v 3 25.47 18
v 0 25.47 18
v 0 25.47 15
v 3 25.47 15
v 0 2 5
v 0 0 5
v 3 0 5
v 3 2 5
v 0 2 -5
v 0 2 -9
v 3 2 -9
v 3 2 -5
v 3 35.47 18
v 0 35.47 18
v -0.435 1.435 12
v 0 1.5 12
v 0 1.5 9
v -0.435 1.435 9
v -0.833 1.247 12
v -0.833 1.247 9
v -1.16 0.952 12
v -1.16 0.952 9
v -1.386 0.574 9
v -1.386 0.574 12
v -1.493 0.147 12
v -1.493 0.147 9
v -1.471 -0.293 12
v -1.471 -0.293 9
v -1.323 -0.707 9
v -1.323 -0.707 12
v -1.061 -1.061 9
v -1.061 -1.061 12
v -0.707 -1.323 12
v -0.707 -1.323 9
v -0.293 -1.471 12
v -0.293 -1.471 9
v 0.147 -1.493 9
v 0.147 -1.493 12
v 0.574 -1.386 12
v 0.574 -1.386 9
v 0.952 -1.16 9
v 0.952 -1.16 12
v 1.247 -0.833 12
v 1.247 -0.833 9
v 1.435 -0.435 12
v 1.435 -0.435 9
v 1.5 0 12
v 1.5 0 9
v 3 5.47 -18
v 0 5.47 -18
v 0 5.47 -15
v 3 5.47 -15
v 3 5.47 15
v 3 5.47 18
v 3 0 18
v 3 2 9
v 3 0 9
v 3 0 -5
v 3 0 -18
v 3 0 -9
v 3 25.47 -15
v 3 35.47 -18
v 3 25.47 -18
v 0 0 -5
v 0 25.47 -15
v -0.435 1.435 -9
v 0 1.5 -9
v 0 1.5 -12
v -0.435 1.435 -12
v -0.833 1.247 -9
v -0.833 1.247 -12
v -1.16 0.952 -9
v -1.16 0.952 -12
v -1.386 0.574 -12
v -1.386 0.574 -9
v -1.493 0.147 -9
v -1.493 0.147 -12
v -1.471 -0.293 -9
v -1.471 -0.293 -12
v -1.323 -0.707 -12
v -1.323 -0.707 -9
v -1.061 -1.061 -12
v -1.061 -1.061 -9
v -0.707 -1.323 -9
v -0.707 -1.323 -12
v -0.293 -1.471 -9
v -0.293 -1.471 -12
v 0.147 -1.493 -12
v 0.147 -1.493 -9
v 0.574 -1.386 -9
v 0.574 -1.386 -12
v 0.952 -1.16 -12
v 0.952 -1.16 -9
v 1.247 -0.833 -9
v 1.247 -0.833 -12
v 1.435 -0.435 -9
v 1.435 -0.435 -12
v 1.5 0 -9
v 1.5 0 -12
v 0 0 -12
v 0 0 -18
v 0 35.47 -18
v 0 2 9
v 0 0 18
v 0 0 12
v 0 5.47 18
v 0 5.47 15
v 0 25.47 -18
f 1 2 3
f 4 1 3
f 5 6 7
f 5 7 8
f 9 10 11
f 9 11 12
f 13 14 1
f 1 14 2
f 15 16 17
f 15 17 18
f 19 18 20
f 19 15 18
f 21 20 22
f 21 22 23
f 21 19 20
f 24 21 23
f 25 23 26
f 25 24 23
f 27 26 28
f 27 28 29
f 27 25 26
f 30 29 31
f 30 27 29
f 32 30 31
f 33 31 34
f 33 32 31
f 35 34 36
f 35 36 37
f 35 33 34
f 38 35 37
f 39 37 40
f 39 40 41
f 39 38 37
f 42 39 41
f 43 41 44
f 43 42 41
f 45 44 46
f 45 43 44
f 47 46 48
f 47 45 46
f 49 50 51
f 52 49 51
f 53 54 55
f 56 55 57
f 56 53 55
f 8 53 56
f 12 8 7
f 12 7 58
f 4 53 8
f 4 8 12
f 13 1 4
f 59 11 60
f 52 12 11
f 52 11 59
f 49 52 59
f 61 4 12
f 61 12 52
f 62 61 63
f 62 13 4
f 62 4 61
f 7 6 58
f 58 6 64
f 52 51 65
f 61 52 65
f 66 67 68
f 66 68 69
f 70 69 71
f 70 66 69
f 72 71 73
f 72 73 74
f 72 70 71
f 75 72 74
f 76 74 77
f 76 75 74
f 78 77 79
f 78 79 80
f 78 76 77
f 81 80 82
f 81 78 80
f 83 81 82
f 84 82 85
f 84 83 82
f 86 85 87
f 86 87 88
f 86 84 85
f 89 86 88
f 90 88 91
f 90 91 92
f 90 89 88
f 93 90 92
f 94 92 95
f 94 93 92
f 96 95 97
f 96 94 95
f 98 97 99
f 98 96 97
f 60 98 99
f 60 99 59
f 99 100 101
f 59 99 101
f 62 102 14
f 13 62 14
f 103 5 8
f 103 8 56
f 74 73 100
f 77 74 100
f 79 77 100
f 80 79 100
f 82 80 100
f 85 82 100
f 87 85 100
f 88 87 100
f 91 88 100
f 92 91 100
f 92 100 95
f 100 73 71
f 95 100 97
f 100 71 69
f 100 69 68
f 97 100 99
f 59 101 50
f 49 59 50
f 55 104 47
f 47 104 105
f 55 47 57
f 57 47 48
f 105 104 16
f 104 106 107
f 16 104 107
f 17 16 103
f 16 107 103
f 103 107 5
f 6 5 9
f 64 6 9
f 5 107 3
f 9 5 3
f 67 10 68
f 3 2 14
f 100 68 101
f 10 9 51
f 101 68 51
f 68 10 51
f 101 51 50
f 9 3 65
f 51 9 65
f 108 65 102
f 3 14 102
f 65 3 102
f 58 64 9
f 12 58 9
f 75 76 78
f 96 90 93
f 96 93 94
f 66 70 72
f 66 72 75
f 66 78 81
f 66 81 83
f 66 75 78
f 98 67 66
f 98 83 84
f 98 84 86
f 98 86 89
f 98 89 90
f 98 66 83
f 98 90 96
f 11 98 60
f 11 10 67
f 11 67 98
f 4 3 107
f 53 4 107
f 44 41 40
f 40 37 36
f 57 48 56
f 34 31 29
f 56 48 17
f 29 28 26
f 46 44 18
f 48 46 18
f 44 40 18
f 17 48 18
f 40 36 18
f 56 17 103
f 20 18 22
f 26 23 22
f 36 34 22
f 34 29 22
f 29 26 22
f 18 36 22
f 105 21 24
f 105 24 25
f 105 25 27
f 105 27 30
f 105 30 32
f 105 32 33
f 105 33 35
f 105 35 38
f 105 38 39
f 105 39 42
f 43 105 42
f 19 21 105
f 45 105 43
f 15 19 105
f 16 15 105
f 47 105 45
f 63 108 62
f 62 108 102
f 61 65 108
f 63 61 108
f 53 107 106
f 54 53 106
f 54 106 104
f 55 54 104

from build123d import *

# Parameters (mm, degrees)
BOSS_EXTRUDE1_DEPTH = 3
SKETCH4_R           = 1.5
BOSS_EXTRUDE2_DEPTH = 3
LPATTERN1_COUNT     = 2
LPATTERN1_PITCH     = 21
SKETCH5_W           = 4
SKETCH5_H           = 2
CUT_EXTRUDE1_DEPTH  = 10


with BuildPart() as part:
    # Sketch1 → Boss-Extrude1 (new body)
    with BuildSketch(Plane(origin=(0, 0, 0), x_dir=(0, 0, -1), z_dir=(1, 0, 0))):
        Polygon((-15, 0), (15, 0), (18, 0), (18, 5.47), (15, 5.47), (15, 25.47), (18, 25.47), (18, 35.47), (15, 35.47), (-15, 35.47), (-18, 35.47), (-18, 25.47), (-15, 25.47), (-15, 5.47), (-18, 5.47), (-18, 0), align=None)
    extrude(amount=BOSS_EXTRUDE1_DEPTH)

    # Sketch4 → Boss-Extrude2 (add)
    with BuildSketch(Plane.XY.offset(12)):
        Circle(SKETCH4_R)
    boss_extrude2 = extrude(amount=-BOSS_EXTRUDE2_DEPTH)

    # LPattern1: Boss-Extrude2 ×2
    with Locations(*[(0, 0, -i * LPATTERN1_PITCH) for i in range(1, LPATTERN1_COUNT)]):
        add(boss_extrude2)

    # Sketch5 → Cut-Extrude1 (cut)
    with BuildSketch(Plane.ZY):
        with Locations((-7, 1)):
            Rectangle(SKETCH5_W, SKETCH5_H)
        with Locations((7, 1)):
            Rectangle(SKETCH5_W, SKETCH5_H)
    extrude(amount=-CUT_EXTRUDE1_DEPTH, mode=Mode.SUBTRACT)


solid = part.part
